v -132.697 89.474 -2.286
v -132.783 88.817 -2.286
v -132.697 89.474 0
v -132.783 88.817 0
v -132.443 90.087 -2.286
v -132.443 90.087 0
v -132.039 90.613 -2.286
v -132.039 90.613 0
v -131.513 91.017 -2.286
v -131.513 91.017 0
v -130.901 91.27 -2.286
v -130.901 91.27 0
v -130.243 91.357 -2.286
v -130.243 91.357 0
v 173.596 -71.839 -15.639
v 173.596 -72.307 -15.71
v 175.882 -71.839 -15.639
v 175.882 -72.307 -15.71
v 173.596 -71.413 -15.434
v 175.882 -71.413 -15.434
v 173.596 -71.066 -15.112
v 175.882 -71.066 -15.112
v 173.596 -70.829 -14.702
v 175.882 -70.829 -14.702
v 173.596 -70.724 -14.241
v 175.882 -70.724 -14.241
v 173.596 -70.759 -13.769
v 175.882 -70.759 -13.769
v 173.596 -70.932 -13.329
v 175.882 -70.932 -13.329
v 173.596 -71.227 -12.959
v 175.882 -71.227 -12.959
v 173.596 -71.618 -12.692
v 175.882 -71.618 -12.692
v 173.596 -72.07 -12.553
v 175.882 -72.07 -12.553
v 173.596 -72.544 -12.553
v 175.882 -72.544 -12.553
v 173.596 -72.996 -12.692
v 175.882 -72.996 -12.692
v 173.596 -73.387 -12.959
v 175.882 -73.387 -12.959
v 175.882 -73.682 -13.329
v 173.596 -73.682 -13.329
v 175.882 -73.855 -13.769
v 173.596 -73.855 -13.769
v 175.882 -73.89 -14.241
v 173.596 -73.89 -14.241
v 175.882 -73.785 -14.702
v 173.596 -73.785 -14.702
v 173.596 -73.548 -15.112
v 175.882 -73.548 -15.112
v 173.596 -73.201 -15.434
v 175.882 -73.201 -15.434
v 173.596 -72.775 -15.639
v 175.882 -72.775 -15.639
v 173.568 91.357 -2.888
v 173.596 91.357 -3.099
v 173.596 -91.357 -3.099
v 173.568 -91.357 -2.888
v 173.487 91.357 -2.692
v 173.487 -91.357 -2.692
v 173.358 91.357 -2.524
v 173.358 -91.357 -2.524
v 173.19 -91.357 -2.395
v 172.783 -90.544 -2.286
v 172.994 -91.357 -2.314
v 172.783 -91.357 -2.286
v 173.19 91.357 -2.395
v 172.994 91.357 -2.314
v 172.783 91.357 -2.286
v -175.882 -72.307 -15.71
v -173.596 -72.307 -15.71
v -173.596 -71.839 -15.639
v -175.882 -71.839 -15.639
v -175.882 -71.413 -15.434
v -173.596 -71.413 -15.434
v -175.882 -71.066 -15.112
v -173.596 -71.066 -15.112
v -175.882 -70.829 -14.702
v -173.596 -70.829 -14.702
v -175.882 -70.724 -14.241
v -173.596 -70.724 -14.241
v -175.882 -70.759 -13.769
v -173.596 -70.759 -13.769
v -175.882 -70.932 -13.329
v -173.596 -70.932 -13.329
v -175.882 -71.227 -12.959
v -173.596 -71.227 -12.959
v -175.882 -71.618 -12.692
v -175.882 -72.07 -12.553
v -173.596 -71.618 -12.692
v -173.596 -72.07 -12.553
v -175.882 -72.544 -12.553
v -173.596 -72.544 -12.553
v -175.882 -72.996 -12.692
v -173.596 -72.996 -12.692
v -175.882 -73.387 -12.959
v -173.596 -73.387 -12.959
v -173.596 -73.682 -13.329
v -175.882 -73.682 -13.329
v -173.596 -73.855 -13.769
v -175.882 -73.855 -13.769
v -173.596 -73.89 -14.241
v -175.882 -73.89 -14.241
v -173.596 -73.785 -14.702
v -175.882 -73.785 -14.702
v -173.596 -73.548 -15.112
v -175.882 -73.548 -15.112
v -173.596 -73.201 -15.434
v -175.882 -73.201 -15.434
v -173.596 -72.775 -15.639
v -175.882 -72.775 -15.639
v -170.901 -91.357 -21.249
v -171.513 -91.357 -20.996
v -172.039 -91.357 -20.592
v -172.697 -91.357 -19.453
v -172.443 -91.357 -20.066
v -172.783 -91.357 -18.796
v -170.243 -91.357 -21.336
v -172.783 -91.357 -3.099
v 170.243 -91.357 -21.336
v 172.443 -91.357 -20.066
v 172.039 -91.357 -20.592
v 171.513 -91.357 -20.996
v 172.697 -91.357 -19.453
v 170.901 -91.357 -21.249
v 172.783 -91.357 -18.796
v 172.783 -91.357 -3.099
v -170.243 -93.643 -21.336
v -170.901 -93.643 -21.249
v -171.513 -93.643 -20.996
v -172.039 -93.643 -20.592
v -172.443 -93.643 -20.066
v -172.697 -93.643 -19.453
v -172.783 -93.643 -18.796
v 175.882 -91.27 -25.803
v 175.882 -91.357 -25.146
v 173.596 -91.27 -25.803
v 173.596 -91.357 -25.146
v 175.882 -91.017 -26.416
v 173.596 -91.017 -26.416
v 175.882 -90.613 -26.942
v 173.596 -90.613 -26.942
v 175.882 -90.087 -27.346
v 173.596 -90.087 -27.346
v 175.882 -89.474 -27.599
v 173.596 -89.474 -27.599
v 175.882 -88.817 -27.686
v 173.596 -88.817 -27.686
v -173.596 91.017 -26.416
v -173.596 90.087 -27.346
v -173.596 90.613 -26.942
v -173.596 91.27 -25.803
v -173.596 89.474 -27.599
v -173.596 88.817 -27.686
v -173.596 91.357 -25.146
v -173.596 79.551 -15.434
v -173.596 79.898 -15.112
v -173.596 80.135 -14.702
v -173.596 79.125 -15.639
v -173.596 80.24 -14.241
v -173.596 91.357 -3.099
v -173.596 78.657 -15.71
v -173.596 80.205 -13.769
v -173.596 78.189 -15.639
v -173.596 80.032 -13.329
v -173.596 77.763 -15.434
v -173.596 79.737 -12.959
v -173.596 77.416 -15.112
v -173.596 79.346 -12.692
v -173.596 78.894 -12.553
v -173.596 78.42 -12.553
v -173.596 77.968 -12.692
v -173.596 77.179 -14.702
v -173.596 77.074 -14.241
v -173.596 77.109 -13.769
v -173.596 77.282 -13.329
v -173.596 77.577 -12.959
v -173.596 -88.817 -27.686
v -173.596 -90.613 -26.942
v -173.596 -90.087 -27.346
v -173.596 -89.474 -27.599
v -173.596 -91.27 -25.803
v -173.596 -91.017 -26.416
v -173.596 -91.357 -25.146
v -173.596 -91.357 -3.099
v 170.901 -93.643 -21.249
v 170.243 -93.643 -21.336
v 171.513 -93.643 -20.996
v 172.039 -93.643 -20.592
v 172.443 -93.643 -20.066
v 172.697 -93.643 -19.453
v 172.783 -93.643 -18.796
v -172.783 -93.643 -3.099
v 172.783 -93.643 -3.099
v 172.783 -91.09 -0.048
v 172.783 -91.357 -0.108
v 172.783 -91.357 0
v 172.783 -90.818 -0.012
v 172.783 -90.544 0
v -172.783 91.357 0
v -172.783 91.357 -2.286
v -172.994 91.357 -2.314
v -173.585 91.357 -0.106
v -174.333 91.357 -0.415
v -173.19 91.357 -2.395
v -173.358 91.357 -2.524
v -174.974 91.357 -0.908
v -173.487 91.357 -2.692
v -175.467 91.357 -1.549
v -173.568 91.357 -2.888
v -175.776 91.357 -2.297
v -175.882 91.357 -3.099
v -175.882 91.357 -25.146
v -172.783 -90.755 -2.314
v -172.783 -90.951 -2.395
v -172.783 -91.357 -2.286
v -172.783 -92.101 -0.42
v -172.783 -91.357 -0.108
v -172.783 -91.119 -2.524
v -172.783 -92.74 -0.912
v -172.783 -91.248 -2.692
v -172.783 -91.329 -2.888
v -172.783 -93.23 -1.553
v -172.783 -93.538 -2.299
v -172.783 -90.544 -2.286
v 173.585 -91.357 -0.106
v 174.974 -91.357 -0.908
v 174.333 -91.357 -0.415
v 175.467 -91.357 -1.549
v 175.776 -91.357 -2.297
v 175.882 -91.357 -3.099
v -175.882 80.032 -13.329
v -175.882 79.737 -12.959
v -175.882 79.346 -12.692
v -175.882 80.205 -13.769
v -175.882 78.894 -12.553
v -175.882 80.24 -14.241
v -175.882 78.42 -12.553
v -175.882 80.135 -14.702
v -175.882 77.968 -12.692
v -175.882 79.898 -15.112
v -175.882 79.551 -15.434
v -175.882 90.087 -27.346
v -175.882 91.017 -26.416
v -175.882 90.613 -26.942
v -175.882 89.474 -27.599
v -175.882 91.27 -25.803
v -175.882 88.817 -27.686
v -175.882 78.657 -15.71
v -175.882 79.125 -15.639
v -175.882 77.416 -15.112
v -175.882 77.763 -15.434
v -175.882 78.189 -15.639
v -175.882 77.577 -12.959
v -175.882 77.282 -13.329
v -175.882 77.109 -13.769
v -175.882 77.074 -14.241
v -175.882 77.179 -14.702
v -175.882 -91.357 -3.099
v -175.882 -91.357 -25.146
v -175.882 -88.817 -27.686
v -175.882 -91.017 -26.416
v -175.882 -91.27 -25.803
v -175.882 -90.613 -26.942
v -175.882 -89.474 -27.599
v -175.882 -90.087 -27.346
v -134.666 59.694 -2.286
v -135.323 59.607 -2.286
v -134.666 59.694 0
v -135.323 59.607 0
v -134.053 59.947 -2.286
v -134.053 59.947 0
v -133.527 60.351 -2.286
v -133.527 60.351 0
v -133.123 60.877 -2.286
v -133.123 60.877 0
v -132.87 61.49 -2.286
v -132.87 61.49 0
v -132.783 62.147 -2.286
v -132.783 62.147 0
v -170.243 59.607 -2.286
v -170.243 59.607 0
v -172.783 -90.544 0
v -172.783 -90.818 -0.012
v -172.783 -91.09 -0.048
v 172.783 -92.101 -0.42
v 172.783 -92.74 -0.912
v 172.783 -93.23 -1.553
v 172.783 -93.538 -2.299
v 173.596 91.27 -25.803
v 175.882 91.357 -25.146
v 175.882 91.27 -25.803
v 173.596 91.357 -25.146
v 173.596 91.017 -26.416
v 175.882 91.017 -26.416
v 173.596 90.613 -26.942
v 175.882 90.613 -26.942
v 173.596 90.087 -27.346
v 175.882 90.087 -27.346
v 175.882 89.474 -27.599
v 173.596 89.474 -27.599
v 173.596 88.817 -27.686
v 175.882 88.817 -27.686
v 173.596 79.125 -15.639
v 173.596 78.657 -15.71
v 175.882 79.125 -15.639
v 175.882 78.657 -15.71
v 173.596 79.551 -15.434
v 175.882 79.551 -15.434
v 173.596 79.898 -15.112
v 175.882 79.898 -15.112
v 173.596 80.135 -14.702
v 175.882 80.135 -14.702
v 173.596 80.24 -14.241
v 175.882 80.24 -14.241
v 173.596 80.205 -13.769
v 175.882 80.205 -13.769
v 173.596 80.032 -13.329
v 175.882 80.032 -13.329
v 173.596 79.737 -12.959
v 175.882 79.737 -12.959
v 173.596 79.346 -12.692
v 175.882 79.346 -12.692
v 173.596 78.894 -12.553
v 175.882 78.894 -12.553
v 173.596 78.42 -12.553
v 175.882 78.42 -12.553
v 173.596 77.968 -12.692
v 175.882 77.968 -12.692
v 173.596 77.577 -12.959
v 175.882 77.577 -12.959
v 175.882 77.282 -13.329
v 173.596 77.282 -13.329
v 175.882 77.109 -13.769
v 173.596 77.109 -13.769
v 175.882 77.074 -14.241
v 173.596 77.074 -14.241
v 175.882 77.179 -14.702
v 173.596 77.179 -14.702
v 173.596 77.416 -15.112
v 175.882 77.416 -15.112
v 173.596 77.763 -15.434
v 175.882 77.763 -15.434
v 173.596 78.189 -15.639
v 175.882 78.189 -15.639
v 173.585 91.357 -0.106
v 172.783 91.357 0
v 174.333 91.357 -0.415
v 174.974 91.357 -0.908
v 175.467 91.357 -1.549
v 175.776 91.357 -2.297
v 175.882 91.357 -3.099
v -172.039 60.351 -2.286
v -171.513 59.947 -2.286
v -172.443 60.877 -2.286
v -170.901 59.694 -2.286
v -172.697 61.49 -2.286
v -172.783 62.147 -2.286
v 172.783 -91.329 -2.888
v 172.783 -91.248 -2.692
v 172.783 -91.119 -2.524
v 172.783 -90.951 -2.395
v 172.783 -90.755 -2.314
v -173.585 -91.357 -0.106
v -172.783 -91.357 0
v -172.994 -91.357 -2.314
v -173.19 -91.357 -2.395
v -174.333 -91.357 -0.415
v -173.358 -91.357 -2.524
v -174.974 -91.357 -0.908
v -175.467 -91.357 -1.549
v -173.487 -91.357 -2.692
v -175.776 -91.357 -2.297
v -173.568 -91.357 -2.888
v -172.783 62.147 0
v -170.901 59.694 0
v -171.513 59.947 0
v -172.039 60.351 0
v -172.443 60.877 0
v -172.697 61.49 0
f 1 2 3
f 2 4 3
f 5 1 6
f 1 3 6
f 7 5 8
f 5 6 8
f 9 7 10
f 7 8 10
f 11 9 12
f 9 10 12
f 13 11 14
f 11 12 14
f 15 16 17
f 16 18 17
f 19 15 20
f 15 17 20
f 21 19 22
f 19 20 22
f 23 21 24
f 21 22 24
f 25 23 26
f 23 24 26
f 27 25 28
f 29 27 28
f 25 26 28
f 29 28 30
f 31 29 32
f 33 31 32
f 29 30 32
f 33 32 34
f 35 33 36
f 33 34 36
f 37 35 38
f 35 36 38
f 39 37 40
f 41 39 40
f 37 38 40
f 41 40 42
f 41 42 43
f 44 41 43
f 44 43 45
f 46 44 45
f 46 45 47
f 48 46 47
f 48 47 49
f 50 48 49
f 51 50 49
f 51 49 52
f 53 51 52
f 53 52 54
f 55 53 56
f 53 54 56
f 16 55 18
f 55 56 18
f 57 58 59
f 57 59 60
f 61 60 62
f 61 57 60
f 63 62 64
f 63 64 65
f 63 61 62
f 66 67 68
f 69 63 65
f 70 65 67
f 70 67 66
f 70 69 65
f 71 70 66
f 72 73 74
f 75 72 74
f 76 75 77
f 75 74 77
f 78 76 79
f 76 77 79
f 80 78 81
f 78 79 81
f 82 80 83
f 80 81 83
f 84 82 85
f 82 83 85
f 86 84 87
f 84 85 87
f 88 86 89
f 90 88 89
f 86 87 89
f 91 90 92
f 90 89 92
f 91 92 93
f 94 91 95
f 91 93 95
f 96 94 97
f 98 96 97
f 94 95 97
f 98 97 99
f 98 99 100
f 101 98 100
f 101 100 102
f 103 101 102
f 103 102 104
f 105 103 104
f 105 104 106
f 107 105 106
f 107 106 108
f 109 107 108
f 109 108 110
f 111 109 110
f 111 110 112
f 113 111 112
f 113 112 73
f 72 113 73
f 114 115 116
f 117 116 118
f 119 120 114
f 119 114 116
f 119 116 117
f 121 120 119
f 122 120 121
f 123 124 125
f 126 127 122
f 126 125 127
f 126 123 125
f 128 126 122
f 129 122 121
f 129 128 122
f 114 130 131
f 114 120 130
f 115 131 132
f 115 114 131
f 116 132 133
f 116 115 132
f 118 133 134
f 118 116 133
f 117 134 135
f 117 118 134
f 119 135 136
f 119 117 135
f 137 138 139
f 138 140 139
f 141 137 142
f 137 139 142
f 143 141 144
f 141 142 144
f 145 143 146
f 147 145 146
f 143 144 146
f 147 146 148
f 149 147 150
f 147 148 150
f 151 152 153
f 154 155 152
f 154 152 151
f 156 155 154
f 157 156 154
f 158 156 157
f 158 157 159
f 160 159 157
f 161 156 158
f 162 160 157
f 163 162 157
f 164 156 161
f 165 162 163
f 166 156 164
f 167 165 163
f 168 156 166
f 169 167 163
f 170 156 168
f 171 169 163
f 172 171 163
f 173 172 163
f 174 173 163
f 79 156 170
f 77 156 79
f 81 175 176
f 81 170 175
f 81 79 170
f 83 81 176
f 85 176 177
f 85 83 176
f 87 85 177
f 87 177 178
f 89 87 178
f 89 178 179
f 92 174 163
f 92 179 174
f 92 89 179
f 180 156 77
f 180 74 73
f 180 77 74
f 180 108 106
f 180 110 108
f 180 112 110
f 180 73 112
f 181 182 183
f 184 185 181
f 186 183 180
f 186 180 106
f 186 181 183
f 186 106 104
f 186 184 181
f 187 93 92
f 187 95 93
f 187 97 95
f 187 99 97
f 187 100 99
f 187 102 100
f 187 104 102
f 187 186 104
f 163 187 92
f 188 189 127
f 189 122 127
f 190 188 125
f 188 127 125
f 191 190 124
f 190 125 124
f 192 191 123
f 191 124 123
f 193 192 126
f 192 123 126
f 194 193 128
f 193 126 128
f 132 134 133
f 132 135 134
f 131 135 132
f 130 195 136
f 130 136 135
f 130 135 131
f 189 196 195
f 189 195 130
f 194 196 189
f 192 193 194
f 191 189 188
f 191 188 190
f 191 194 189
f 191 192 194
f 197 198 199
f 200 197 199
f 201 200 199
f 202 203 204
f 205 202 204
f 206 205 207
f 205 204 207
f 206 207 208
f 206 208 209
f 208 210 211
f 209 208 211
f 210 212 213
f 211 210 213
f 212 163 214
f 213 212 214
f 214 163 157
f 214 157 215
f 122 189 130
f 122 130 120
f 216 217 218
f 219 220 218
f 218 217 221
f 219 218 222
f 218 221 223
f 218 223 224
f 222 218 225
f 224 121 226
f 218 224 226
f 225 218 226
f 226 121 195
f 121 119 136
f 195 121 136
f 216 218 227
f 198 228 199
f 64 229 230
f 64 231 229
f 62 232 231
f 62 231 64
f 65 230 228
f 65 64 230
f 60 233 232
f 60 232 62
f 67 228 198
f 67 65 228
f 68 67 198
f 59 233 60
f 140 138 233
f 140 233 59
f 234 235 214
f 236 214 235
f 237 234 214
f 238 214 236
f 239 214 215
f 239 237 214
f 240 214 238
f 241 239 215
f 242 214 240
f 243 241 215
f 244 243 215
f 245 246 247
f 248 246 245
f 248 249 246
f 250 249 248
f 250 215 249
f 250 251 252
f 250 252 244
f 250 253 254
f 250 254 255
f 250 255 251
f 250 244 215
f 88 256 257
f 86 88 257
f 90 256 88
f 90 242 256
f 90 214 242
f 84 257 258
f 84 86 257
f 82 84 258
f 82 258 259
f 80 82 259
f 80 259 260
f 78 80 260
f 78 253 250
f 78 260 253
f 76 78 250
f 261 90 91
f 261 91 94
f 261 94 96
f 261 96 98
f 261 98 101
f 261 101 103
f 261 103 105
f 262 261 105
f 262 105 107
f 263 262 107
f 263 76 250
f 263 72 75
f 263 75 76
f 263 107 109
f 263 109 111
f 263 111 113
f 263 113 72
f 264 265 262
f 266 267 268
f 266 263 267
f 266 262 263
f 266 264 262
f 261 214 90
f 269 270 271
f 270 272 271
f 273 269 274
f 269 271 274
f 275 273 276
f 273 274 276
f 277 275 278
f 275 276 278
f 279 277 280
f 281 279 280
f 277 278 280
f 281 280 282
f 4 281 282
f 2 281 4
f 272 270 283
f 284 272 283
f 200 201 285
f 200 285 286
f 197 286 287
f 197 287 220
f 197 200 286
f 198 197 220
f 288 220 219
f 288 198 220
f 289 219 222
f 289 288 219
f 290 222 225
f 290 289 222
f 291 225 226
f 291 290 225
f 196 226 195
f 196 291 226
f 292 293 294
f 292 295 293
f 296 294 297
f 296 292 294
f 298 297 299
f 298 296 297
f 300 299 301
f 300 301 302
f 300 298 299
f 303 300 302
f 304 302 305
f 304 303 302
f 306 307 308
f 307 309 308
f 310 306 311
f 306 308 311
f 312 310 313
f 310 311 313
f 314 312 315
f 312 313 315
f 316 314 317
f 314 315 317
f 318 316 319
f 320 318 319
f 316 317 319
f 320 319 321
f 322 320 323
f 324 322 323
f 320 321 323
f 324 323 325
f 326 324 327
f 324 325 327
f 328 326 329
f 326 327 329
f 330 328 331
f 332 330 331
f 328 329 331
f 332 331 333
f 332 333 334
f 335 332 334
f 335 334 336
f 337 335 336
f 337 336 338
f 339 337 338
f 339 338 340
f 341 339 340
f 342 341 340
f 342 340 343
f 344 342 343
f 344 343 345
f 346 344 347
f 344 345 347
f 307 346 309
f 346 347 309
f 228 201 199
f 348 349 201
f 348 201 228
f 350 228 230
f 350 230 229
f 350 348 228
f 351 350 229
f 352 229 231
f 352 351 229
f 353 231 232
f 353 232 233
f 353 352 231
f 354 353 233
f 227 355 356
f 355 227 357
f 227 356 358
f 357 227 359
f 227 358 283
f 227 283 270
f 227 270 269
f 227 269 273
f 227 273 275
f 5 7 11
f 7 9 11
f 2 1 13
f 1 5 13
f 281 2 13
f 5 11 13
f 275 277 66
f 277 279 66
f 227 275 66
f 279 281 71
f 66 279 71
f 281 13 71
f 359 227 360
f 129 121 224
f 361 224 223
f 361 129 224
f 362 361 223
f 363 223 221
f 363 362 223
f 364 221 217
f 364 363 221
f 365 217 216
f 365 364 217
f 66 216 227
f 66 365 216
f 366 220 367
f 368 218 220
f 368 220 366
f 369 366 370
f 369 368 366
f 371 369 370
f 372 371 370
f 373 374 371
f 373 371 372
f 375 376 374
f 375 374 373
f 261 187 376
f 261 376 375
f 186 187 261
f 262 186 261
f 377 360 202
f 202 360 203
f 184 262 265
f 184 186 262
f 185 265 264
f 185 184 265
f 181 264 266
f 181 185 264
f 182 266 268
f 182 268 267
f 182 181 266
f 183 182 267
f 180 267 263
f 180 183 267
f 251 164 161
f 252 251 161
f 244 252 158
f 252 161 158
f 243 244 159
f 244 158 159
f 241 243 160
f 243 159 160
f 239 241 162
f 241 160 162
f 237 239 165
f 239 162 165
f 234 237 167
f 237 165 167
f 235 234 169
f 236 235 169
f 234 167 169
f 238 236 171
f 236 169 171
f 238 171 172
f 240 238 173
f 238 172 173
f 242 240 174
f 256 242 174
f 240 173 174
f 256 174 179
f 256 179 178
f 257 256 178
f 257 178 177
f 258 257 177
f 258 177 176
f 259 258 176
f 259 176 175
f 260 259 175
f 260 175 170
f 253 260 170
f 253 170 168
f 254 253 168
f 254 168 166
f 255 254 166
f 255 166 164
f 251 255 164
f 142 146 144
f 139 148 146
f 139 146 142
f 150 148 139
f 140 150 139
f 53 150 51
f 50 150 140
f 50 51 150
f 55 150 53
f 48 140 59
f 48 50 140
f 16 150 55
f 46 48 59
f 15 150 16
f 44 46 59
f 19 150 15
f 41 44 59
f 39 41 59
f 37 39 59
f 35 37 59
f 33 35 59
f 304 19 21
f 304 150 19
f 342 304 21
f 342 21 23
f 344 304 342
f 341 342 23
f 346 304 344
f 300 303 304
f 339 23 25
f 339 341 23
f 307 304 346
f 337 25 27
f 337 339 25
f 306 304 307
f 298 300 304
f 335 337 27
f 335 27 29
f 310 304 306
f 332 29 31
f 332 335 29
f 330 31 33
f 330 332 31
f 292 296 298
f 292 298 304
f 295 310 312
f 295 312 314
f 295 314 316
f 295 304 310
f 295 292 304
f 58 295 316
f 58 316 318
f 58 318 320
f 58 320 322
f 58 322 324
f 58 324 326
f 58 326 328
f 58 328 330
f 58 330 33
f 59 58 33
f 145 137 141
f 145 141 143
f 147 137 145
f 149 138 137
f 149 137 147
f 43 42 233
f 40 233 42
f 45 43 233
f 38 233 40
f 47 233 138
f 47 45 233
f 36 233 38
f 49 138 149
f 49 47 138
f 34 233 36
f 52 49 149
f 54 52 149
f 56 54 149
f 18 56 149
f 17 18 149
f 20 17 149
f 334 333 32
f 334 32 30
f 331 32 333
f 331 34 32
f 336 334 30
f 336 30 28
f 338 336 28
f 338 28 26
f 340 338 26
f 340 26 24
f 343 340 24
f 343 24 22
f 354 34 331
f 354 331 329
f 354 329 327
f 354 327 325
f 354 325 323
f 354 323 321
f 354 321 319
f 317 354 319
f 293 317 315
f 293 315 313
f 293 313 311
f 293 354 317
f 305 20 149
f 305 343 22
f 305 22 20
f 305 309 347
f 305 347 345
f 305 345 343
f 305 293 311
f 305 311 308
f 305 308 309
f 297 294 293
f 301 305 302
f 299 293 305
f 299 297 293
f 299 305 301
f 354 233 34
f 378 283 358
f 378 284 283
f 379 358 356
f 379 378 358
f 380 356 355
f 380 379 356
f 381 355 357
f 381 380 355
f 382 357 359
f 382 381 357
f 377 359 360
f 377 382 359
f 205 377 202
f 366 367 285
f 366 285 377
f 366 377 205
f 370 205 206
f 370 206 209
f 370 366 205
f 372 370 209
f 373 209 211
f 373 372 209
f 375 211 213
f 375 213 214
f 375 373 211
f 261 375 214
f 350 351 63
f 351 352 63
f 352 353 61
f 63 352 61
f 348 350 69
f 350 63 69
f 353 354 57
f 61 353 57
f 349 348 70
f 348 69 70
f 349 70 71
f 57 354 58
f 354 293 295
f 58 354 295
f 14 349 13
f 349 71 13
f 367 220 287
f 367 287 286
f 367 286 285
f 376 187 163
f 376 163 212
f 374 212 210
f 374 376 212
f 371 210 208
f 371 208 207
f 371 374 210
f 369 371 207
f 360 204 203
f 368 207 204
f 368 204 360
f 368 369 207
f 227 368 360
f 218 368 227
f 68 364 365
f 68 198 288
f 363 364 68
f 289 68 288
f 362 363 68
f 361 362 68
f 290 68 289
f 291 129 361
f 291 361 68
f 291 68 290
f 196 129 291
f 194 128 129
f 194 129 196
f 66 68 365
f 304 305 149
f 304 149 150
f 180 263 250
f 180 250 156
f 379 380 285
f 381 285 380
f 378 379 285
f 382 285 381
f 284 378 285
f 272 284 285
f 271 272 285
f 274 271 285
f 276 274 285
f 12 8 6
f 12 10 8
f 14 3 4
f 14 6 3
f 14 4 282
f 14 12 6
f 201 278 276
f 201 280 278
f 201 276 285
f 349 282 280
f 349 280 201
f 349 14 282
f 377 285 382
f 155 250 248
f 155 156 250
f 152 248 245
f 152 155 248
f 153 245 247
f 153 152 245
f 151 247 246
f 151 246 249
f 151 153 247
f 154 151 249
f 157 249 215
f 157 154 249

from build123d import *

# Parameters (mm, degrees)
SKETCH1_W                      = 347.1920001
SKETCH1_H                      = 182.714000078
BASE_FLANGE1_DEPTH             = 2.286
EDGE_FLANGE1_STRIP_W           = 10.7696
EDGE_FLANGE1_STRIP_H           = 2.286
EDGE_FLANGE1_STRIP_CUT_DEPTH   = 182.714000078
EDGE_FLANGE1_STRIP_2_W         = 10.7696
EDGE_FLANGE1_STRIP_2_H         = 2.286
EDGE_FLANGE1_STRIP_CUT_2_DEPTH = 182.714000078
EDGE_FLANGE1_DEPTH             = 182.714000078
EDGE_FLANGE1_BEND_DEPTH        = 182.714000078
EDGE_FLANGE2_STRIP_W           = 10.7696
EDGE_FLANGE2_STRIP_H           = 2.286
EDGE_FLANGE2_STRIP_CUT_DEPTH   = 345.5664001
EDGE_FLANGE2_DEPTH             = 345.5664001
SKETCH17_W                     = 40
SKETCH17_H                     = 31.75
CUT_EXTRUDE1_DEPTH             = 201.869732409
FILLET1_R                      = 2.54
F_1_8_0_1250_DOWEL_HOLE1_D     = 3.175
F_1_8_0_1250_DOWEL_HOLE1_DEPTH = 351.7640001
F_1_8_0_1250_DOWEL_HOLE1_TIP   = 0.953866233


# Sheet-metal steps are written as plain solids
with BuildPart() as part:
    # Sketch1 → Base-Flange1 (new body)
    with BuildSketch(Plane.XY):
        Rectangle(SKETCH1_W, SKETCH1_H)
    extrude(amount=-BASE_FLANGE1_DEPTH)

    # Edge-Flange1 strip (across the edge) → Edge-Flange1 strip cut (cut)
    with BuildSketch(Plane(origin=(173.59600005, 91.357000039, -2.286), x_dir=(-1, 0, 0), z_dir=(0, -1, 0))):
        with Locations((-4.572, -1.143)):
            Rectangle(EDGE_FLANGE1_STRIP_W, EDGE_FLANGE1_STRIP_H)
    extrude(amount=EDGE_FLANGE1_STRIP_CUT_DEPTH, mode=Mode.SUBTRACT)

    # Edge-Flange1 strip 2 (across the edge) → Edge-Flange1 strip cut 2 (cut)
    with BuildSketch(Plane(origin=(-173.59600005, -91.357000039, -2.286), x_dir=(1, 0, 0), z_dir=(0, 1, 0))):
        with Locations((-4.572, -1.143)):
            Rectangle(EDGE_FLANGE1_STRIP_2_W, EDGE_FLANGE1_STRIP_2_H)
    extrude(amount=EDGE_FLANGE1_STRIP_CUT_2_DEPTH, mode=Mode.SUBTRACT)

    # Edge-Flange1 section (across the edge) → Edge-Flange1 (add)
    with BuildSketch(Plane(origin=(173.59600005, 91.357000039, -2.286), x_dir=(-1, 0, 0), z_dir=(0, -1, 0))):
        with BuildLine():
            Line((-2.286, 0.8128), (-2.286, 25.4))
            Line((-2.286, 25.4), (0, 25.4))
            Line((0, 25.4), (0, 0.8128))
            ThreePointArc((0, 0.8128), (0.238063608, 0.238063608), (0.8128, 0))
            Line((0.8128, 0), (0.8128, -2.286))
            ThreePointArc((0.8128, -2.286), (-1.378382494, -1.378382494), (-2.286, 0.8128))
        make_face()
    extrude(amount=EDGE_FLANGE1_DEPTH)

    # Edge-Flange1 section 2 (across the edge) → Edge-Flange1 bend (add)
    with BuildSketch(Plane(origin=(-173.59600005, -91.357000039, -2.286), x_dir=(1, 0, 0), z_dir=(0, 1, 0))):
        with BuildLine():
            Line((-2.286, 0.8128), (-2.286, 25.4))
            Line((-2.286, 25.4), (0, 25.4))
            Line((0, 25.4), (0, 0.8128))
            ThreePointArc((0, 0.8128), (0.238063608, 0.238063608), (0.8128, 0))
            Line((0.8128, 0), (0.8128, -2.286))
            ThreePointArc((0.8128, -2.286), (-1.378382494, -1.378382494), (-2.286, 0.8128))
        make_face()
    extrude(amount=EDGE_FLANGE1_BEND_DEPTH)

    # Edge-Flange2 strip (across the edge) → Edge-Flange2 strip cut (cut)
    with BuildSketch(Plane(origin=(172.78320005, -91.357000039, -2.286), x_dir=(0, 1, 0), z_dir=(-1, 0, 0))):
        with Locations((-4.572, -1.143)):
            Rectangle(EDGE_FLANGE2_STRIP_W, EDGE_FLANGE2_STRIP_H)
    extrude(amount=EDGE_FLANGE2_STRIP_CUT_DEPTH, mode=Mode.SUBTRACT)

    # Edge-Flange2 section (across the edge) → Edge-Flange2 (add)
    with BuildSketch(Plane(origin=(172.78320005, -91.357000039, -2.286), x_dir=(0, 1, 0), z_dir=(-1, 0, 0))):
        with BuildLine():
            Line((-2.286, 0.8128), (-2.286, 19.05))
            Line((-2.286, 19.05), (0, 19.05))
            Line((0, 19.05), (0, 0.8128))
            ThreePointArc((0, 0.8128), (0.238063608, 0.238063608), (0.8128, 0))
            Line((0.8128, 0), (0.8128, -2.286))
            ThreePointArc((0.8128, -2.286), (-1.378382494, -1.378382494), (-2.286, 0.8128))
        make_face()
    extrude(amount=EDGE_FLANGE2_DEPTH)

    # Sketch17 → Cut-Extrude1 (cut, through all)
    with BuildSketch(Plane(origin=(0, 0, -2.286), x_dir=(-1, 0, 0), z_dir=(0, 0, -1))):
        with Locations((152.78320005, 75.482000039)):
            Rectangle(SKETCH17_W, SKETCH17_H)
    extrude(amount=-CUT_EXTRUDE1_DEPTH, mode=Mode.SUBTRACT)

    # Fillet1
    fillet1_edges = [part.edges().sort_by_distance(p)[0] for p in [
        (172.78320005, -92.500000039, -21.336),
        (-172.78320005, -92.500000039, -21.336),
        (-172.78320005, 59.607000039, -1.143),
        (-132.78320005, 59.607000039, -1.143),
        (-132.78320005, 91.357000039, -1.143),
        (174.73900005, 91.357000039, -27.686),
        (174.73900005, -91.357000039, -27.686),
        (-174.73900005, -91.357000039, -27.686),
        (-174.73900005, 91.357000039, -27.686),
    ]]
    fillet(fillet1_edges, radius=FILLET1_R)

    # 1/8 (0.1250) Dowel Hole1
    with Locations(Plane.ZY.offset(175.88200005)):
        with Locations((-14.1224, -72.307000039), (-14.1224, 78.657000039)):
            Hole(F_1_8_0_1250_DOWEL_HOLE1_D / 2, depth=F_1_8_0_1250_DOWEL_HOLE1_DEPTH)
            with Locations((0, 0, -(F_1_8_0_1250_DOWEL_HOLE1_DEPTH + F_1_8_0_1250_DOWEL_HOLE1_TIP / 2))):  # 118° drill point
                Cone(0, F_1_8_0_1250_DOWEL_HOLE1_D / 2, F_1_8_0_1250_DOWEL_HOLE1_TIP, mode=Mode.SUBTRACT)


solid = part.part
